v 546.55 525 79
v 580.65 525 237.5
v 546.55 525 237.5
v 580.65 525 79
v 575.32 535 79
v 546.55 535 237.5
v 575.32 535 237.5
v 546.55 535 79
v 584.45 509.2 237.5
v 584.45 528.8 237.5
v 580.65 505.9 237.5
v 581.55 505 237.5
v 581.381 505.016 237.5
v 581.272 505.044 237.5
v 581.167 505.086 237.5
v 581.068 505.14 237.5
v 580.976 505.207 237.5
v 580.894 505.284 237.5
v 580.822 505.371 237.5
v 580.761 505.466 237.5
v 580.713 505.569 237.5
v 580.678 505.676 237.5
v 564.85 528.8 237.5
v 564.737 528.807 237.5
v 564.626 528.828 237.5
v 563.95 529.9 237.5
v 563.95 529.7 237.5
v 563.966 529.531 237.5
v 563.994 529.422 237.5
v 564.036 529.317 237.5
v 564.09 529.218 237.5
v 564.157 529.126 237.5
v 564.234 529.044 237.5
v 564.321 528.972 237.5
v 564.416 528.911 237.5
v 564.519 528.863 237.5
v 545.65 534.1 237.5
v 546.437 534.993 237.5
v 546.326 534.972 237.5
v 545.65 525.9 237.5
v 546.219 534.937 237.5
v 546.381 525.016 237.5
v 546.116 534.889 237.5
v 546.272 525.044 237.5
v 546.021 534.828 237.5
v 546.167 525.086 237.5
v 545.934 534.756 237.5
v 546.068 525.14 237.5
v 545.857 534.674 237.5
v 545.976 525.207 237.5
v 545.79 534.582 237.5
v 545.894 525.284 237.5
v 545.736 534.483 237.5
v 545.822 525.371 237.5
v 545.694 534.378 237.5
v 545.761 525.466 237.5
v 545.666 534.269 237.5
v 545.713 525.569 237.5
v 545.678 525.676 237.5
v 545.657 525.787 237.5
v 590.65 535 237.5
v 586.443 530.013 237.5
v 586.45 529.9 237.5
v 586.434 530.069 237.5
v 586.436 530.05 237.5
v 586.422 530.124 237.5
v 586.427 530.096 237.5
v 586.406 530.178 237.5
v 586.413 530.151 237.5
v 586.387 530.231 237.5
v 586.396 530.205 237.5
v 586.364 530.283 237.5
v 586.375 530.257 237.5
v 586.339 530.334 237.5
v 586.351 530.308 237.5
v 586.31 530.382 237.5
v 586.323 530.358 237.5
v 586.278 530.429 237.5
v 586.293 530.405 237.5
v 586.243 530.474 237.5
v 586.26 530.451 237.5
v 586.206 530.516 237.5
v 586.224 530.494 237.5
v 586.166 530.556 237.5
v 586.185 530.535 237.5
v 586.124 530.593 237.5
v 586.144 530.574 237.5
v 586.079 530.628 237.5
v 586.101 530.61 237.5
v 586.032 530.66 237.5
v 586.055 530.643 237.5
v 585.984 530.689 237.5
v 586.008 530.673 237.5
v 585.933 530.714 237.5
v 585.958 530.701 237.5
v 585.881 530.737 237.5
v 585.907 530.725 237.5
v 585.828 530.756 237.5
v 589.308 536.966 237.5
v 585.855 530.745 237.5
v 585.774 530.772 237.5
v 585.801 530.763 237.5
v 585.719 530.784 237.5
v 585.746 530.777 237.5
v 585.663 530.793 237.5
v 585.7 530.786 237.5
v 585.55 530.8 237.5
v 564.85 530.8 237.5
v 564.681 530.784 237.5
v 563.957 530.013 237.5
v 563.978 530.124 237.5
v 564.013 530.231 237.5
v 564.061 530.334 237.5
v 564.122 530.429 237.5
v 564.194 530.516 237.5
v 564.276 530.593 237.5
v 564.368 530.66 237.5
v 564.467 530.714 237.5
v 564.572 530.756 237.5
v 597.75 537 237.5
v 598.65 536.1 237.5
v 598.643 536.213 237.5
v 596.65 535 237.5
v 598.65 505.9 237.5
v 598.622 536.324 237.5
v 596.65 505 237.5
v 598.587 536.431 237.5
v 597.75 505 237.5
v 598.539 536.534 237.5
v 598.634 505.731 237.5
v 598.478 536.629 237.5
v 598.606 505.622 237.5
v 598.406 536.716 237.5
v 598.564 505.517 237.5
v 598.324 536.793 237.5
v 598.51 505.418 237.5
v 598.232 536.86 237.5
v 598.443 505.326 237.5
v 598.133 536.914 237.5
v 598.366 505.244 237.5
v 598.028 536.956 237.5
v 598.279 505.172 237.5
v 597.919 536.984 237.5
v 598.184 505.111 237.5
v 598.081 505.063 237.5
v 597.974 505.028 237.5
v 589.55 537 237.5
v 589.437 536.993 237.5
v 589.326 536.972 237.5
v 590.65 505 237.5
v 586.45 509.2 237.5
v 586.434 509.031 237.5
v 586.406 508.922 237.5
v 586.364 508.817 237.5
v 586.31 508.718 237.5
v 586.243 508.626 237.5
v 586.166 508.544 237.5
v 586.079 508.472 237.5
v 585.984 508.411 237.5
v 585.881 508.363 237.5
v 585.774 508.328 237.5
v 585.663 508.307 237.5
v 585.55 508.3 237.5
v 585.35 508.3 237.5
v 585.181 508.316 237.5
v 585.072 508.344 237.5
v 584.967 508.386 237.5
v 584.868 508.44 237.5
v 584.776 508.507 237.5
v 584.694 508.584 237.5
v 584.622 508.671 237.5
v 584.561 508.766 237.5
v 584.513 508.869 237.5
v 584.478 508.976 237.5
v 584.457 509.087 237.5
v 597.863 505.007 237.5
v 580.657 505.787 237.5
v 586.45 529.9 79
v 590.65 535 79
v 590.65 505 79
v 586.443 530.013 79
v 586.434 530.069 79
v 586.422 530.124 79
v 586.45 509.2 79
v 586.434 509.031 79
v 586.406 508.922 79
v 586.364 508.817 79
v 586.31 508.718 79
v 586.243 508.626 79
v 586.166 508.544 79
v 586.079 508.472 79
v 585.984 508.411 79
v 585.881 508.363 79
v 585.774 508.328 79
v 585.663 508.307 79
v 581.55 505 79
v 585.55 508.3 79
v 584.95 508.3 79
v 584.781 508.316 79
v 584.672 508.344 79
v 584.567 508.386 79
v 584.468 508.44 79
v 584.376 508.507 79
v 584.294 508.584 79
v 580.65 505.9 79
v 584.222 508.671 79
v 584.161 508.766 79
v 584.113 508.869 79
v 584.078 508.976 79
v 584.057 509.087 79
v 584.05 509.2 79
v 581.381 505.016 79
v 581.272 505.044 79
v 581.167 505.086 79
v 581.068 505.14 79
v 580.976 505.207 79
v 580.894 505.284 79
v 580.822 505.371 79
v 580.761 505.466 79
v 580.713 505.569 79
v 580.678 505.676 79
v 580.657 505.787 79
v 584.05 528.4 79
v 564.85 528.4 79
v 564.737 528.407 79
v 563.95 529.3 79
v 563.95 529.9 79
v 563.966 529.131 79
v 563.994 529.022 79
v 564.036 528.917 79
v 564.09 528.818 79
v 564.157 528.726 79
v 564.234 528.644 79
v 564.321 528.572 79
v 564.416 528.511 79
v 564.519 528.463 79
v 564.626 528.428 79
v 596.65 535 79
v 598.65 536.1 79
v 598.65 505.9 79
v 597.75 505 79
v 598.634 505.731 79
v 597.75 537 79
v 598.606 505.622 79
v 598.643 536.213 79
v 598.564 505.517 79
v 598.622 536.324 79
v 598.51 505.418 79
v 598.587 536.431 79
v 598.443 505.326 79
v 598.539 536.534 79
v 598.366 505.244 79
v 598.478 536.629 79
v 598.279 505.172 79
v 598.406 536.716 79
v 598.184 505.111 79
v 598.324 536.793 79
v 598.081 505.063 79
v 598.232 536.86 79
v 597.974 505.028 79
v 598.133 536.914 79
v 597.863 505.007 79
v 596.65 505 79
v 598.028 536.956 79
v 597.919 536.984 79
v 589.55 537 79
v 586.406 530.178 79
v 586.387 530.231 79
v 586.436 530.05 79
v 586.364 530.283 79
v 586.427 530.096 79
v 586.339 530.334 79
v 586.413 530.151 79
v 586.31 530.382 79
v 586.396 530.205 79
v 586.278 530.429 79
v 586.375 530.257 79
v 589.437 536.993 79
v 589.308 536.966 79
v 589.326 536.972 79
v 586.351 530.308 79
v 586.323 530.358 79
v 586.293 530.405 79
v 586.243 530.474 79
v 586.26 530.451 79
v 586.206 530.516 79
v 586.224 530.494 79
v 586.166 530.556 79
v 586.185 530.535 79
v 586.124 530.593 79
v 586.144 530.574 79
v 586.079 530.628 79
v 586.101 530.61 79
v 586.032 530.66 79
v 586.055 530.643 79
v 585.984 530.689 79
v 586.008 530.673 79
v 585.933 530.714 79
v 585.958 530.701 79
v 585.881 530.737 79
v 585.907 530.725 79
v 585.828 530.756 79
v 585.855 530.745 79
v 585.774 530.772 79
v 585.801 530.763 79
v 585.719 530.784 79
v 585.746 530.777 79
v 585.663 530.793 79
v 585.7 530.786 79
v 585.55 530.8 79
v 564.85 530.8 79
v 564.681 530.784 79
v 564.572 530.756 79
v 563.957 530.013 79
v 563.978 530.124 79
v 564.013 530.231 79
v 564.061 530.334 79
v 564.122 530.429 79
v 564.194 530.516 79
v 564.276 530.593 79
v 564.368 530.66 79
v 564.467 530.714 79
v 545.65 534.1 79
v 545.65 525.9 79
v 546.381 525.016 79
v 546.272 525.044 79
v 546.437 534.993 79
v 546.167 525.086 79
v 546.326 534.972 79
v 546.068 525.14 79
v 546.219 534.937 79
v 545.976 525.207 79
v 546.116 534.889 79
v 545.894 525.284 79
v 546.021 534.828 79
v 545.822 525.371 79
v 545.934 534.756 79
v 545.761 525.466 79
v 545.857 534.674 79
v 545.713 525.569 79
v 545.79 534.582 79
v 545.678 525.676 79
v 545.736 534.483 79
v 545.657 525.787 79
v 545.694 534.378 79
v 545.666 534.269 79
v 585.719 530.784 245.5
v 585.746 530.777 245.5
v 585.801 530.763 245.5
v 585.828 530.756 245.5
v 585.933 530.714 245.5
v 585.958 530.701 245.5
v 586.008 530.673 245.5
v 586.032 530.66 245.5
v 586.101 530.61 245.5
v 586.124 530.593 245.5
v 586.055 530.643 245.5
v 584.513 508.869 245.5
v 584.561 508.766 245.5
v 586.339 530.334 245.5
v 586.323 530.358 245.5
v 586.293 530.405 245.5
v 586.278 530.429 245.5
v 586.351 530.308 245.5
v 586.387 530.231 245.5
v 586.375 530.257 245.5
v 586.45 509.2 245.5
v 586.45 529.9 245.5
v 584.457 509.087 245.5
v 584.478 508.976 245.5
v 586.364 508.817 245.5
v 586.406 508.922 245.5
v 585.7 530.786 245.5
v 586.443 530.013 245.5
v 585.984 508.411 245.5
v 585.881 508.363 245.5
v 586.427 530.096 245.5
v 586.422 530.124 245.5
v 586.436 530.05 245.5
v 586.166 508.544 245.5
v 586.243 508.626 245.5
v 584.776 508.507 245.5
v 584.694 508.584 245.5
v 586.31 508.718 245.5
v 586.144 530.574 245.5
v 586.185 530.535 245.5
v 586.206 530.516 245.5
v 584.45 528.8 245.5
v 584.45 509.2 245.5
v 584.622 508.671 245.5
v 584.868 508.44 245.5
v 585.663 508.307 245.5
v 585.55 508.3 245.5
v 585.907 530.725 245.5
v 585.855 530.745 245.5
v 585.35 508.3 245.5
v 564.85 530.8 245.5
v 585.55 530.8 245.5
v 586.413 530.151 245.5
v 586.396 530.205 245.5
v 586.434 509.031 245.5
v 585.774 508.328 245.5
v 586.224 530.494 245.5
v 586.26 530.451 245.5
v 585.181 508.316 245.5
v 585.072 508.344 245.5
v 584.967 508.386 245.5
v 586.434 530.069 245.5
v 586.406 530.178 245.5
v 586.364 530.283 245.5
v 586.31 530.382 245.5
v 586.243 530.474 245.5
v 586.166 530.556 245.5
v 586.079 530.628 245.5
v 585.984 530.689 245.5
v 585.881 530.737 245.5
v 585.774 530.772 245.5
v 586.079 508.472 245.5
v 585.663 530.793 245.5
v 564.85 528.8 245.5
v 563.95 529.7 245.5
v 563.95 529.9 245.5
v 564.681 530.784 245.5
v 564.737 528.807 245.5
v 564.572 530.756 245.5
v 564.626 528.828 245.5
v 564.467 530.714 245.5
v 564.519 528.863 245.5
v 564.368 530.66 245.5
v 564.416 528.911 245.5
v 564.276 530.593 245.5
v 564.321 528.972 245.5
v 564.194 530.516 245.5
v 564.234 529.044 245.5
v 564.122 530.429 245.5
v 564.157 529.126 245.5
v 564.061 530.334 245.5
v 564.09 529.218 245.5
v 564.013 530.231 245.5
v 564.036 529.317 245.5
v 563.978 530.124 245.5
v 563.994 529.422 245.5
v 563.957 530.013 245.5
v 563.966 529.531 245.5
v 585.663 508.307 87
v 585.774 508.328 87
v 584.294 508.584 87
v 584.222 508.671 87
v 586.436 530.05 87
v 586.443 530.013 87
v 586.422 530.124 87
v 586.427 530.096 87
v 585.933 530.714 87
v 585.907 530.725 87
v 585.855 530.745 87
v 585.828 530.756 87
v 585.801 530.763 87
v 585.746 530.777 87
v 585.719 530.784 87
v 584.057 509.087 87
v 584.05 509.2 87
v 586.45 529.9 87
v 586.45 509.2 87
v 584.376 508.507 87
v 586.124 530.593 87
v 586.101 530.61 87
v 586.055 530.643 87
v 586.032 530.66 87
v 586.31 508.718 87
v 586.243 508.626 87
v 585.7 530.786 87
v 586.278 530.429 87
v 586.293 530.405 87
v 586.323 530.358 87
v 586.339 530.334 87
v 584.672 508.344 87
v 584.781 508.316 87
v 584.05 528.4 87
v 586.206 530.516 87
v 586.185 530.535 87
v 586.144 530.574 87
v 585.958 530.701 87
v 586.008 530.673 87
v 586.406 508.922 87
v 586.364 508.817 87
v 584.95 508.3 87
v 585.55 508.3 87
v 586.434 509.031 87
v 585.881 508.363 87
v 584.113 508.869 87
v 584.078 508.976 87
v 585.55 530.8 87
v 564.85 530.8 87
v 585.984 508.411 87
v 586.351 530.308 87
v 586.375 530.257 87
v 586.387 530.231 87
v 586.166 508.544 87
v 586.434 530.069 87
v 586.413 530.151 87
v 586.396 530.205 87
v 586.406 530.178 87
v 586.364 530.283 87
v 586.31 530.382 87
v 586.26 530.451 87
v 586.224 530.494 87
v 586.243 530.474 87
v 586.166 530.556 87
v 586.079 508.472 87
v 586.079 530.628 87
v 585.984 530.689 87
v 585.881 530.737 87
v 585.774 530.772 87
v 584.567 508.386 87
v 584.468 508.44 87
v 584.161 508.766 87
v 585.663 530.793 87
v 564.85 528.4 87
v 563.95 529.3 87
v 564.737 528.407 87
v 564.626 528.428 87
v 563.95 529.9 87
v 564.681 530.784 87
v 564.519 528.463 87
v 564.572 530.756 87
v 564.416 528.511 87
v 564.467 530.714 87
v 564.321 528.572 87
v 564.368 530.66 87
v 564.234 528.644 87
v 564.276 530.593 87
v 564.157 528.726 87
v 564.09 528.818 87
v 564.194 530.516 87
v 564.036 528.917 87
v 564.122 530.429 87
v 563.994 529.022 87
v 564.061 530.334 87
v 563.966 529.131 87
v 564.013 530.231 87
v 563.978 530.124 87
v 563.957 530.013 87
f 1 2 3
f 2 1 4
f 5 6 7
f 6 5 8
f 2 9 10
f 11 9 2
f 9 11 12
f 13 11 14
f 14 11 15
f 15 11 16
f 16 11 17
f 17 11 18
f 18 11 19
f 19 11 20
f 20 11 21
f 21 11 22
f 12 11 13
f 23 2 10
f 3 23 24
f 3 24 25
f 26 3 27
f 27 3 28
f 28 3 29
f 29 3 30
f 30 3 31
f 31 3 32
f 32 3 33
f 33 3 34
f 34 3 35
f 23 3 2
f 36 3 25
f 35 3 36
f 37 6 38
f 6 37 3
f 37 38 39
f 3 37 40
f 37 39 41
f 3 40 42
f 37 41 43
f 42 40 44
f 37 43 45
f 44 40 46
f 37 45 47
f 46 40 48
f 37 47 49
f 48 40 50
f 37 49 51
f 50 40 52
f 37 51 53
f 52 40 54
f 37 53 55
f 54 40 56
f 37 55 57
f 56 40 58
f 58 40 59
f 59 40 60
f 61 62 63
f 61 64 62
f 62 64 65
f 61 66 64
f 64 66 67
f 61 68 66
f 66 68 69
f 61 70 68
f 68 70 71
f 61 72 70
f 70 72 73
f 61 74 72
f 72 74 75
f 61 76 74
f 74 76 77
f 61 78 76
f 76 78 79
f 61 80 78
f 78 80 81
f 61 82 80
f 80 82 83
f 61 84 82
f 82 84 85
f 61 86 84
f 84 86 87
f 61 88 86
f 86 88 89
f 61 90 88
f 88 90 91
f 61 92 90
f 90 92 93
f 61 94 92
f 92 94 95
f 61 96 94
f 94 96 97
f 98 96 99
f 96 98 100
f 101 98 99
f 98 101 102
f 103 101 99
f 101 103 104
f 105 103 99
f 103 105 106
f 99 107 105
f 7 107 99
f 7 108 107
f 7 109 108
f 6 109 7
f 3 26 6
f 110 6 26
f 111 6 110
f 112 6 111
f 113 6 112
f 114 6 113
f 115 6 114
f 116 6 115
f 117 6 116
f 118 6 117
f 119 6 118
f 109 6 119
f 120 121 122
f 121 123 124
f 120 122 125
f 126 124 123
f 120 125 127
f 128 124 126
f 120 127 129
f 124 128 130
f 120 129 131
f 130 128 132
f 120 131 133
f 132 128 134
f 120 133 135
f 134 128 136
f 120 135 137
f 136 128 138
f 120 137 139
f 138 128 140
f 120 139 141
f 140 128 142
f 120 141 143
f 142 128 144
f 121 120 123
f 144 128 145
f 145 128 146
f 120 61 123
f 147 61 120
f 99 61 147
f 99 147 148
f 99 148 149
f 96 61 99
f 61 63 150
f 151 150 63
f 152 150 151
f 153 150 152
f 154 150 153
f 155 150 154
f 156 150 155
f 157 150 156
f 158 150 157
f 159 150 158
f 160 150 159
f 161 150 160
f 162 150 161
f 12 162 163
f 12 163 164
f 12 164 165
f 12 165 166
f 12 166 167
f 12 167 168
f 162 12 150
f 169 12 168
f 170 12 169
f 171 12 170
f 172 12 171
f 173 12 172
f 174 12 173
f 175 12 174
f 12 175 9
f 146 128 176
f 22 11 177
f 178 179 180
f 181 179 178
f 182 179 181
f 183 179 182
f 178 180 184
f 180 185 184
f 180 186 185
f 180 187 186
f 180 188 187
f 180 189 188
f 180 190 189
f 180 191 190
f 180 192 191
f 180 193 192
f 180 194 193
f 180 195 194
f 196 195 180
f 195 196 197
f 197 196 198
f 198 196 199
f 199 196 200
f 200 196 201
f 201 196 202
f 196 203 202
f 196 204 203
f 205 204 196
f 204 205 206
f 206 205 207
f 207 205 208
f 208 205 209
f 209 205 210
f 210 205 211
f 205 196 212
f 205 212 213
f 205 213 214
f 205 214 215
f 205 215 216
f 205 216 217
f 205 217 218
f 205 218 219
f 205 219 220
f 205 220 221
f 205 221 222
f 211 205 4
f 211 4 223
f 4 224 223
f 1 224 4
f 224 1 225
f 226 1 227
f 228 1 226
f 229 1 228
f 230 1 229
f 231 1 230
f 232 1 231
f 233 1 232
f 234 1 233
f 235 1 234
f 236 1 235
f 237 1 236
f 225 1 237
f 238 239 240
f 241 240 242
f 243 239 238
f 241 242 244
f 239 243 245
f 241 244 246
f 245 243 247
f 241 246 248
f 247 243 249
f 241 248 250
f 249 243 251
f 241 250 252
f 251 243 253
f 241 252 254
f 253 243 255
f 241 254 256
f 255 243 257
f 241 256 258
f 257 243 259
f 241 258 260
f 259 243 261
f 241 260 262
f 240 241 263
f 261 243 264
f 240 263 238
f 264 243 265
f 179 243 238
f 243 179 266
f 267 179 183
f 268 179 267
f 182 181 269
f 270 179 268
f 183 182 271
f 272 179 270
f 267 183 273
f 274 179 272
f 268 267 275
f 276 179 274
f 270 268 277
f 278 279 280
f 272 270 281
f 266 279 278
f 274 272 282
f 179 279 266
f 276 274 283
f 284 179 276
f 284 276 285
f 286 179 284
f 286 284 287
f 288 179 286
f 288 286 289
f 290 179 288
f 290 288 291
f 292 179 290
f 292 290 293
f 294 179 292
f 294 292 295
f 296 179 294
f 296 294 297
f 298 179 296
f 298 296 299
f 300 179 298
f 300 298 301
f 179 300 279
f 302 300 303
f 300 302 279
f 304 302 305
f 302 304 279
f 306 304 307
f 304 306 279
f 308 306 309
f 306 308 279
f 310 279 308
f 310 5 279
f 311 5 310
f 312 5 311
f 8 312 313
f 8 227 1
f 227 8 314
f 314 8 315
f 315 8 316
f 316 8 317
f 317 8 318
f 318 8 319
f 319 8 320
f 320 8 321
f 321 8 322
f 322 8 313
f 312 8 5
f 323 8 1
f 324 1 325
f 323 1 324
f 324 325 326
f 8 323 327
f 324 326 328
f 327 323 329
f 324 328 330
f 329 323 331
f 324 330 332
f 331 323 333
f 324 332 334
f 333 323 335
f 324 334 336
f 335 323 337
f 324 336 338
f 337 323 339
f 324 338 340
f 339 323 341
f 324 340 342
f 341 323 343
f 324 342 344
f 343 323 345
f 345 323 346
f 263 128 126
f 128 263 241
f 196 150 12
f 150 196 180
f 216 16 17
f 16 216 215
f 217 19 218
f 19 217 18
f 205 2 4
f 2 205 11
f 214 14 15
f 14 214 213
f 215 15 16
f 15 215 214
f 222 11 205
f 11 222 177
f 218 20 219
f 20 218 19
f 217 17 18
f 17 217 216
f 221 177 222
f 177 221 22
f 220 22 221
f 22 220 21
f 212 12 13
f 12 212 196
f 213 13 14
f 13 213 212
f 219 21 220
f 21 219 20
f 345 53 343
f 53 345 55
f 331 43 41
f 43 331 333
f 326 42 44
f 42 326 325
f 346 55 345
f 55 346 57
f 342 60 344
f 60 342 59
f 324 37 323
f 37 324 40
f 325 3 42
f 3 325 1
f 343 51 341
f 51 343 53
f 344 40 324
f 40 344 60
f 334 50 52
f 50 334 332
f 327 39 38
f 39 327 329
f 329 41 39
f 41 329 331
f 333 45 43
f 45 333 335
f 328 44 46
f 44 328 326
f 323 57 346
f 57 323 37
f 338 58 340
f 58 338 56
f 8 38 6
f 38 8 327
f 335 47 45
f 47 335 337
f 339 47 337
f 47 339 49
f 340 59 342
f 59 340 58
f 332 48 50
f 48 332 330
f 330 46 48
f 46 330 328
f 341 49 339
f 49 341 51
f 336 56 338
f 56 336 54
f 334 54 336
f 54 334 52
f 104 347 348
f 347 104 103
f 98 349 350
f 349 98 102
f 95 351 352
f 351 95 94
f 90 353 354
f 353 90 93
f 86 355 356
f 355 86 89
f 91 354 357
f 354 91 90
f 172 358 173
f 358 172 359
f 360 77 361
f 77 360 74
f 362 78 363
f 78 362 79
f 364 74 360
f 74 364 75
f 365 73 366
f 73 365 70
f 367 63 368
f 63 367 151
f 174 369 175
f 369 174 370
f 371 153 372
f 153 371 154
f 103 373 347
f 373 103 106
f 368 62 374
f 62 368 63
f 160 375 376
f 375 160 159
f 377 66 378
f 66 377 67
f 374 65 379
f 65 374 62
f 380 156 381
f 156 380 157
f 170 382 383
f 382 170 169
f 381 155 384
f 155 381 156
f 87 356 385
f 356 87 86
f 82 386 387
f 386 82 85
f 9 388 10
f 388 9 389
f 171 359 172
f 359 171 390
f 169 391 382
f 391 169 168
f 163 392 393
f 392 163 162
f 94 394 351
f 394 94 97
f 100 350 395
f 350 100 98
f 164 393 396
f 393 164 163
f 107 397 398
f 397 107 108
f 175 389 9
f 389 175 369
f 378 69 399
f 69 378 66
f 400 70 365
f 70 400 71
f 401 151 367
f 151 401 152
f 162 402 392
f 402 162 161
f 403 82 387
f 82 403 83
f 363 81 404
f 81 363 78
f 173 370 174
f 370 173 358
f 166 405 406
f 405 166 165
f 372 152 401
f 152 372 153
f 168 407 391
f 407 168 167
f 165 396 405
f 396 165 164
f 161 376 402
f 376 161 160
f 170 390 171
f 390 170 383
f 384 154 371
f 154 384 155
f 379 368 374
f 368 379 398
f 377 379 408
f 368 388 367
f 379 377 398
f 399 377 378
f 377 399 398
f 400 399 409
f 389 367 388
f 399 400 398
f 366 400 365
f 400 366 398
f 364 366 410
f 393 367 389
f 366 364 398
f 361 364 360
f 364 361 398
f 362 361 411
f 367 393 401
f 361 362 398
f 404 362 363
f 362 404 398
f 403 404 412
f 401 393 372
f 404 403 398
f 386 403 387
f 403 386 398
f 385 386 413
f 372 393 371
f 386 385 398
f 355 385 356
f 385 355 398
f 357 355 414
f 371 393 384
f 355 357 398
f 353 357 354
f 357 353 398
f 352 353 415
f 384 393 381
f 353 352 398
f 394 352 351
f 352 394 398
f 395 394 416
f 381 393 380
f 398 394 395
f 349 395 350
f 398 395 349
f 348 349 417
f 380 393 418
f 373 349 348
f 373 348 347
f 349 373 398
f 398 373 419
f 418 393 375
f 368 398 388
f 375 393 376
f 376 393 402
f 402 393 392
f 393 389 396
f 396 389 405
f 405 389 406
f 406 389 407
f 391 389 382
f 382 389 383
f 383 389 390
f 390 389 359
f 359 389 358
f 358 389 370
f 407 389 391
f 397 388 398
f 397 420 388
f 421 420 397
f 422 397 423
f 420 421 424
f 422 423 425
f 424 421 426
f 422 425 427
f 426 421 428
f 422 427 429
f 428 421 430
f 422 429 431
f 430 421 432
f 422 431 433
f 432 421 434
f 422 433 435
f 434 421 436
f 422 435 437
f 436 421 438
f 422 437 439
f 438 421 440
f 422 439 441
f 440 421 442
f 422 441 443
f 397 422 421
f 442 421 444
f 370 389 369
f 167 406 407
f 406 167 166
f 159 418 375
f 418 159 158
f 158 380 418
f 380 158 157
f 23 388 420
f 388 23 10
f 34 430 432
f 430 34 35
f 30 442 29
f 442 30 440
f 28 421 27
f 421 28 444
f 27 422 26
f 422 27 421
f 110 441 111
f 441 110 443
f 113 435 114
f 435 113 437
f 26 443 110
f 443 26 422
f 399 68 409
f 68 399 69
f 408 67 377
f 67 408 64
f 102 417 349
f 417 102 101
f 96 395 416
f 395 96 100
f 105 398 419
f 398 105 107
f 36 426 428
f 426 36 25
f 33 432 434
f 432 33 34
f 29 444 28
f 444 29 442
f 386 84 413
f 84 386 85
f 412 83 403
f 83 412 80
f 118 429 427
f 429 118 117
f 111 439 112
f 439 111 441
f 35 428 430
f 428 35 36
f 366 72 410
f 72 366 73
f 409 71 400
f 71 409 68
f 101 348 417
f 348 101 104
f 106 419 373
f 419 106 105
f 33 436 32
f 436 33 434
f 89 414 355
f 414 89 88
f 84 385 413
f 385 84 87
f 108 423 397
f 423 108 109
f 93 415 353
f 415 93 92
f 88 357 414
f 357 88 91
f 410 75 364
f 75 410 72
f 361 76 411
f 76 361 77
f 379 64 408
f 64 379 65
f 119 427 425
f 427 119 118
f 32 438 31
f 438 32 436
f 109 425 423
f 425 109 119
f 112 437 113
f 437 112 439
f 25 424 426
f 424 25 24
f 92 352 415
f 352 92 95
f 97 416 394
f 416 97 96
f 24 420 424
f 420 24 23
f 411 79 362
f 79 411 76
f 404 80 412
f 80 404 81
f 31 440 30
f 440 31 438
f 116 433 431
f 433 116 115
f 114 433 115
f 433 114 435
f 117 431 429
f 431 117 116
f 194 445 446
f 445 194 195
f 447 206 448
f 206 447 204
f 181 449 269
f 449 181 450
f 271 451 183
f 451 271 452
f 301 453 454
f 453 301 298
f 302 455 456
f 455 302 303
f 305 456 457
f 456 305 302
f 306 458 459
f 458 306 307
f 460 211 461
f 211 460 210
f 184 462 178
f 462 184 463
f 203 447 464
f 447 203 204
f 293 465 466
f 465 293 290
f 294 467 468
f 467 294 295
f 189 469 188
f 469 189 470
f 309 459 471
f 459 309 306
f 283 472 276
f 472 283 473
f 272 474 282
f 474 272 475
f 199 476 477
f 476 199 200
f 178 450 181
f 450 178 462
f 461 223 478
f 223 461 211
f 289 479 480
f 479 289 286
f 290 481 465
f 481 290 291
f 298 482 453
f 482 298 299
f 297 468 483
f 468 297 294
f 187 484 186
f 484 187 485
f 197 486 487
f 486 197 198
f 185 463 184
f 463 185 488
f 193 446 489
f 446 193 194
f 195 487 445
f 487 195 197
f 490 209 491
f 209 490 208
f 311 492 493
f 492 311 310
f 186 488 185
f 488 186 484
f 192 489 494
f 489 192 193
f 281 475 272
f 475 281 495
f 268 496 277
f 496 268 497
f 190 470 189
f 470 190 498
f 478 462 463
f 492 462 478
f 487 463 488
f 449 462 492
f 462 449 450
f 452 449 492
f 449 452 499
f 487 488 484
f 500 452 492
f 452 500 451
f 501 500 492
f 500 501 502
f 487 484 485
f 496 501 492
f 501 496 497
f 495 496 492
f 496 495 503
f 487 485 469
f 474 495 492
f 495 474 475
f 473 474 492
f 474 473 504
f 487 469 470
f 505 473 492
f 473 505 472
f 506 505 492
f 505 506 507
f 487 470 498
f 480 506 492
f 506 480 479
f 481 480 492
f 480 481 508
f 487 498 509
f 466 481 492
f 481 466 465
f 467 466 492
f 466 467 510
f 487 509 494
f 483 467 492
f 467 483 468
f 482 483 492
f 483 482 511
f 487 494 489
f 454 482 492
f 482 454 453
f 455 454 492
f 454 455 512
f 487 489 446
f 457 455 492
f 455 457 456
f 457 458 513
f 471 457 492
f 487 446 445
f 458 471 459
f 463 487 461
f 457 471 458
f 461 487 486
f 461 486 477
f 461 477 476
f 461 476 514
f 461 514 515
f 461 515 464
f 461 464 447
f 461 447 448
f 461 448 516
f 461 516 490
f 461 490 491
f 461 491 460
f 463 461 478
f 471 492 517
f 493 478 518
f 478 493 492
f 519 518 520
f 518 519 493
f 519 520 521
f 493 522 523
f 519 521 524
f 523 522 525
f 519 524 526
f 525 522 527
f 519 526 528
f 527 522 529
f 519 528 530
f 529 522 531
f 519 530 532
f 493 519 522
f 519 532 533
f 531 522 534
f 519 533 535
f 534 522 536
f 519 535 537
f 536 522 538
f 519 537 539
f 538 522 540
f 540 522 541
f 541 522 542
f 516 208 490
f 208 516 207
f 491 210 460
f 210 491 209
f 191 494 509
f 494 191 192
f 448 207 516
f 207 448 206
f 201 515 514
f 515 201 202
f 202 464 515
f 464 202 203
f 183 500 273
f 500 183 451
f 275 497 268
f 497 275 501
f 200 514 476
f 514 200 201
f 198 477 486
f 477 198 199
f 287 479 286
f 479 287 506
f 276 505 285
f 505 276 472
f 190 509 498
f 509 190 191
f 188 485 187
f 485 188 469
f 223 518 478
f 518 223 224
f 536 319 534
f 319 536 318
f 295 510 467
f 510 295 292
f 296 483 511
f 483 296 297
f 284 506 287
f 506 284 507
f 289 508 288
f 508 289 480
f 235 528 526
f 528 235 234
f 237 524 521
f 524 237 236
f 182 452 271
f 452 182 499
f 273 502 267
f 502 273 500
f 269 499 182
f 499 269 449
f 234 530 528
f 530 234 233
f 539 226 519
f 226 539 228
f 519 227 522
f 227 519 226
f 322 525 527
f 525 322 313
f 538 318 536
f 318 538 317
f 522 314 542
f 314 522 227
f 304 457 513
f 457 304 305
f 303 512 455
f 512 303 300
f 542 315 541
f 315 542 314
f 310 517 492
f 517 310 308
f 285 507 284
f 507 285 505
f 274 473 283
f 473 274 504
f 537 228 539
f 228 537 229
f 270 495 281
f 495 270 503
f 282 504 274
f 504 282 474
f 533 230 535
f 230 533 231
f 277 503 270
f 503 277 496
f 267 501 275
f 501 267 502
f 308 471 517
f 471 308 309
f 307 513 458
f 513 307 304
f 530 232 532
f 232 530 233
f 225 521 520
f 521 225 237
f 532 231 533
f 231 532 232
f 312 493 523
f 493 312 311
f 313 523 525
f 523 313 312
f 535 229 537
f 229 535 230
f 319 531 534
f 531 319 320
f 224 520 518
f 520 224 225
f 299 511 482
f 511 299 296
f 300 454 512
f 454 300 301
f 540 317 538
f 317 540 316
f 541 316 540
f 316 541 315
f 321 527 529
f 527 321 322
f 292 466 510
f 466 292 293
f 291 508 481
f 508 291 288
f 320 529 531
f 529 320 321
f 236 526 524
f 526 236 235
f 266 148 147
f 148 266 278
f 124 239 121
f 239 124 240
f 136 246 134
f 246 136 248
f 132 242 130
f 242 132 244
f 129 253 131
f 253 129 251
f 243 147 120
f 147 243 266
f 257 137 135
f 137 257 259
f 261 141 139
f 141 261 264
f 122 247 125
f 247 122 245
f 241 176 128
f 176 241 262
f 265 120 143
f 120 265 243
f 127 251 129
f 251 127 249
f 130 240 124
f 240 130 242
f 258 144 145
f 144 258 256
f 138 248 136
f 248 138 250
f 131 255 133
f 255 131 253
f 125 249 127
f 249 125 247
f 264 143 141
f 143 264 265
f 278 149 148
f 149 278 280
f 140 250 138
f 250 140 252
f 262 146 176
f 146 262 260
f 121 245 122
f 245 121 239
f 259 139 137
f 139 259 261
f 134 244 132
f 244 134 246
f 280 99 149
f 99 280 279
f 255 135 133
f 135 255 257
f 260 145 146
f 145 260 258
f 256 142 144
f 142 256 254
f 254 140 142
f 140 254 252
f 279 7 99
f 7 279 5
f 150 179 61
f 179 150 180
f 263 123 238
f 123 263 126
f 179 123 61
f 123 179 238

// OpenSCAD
// file: construction.scad
/*
Specialized construction functions specifically for the enclosure.
By combining these operators the various instances of enclosure pieces 
can be constructed.
*/
include <parameters.scad>;
use <utility.scad>;

module lug() {
    ra = knob_diameter/2;
    rb = lug_diameter/2;
    rotate([0,90,90]) 
        rotate_extrude()
            color("DarkSeaGreen")
            polygon([[0,0],[0,lug_height],[rb,lug_height],
                [rb,2.5],[ra,1],[ra,0]]);
}

// extend the corner frame to be symmetrical with the front corner
module extend_frame_x(height=frame_corner_height) {
    union() {
        children();
        color("SteelBlue")
        translate([hinge_inner_diameter*2, hinge_inner_diameter,0]) 
            rotate([0,0,-90])
                frame( hinge_inner_diameter*3+1, 
                    height, hinge_inner_diameter, 
                    corner_roundness );
    }
}

module frame( width, height, thickness, roundness ) {
        linear_extrude(height=height)
            apply_roundness(roundness, $fs =0.01) 
                    square( [thickness, width] );
}

module frame_corner( width, height, thickness, roundness ) {    
    union() {
        mirror([0,1,0]) 
            rotate([0,0,-90])
                frame( width, height, thickness, roundness );
        frame( width, height, thickness + panel_thickness, roundness );
    }   
}

module frame_connector_corner(clearance=0) {
    translate([panel_thickness*1.7,panel_thickness*0.70, 0]) 
        cornerize()
            frame( frame_corner_width*0.75, frame_connector_depth, 
                frame_thickness*.20+clearance, corner_roundness );
        
}

module add_lugs() {   
    union() {
        children();
        translate([lug_offset_x,-lug_height,lug_offset_z]) 
            lug();
        translate([lug_offset_x,-lug_height, lug_offset_z+lug_offset_gap])
            lug(); 
    } 
}

module add_connector(height=frame_corner_height) {
    union() {
        children();

        color("SteelBlue")
        translate([0,0,height])
            frame_connector_corner();
    }
}

module add_hinge_post( top=false ) {
    union() {
        difference() {
            children();

            // create a negative space that snuggly fits the hinge
            translate([frame_corner_width+plastic_thickness+hinge_gap,
                hinge_inner_diameter/2, (top?frame_corner_height:0)])
                mirror(top?[0,0,1]:[0,0,0])
                    union() {
                         height = hinge_height-hinge_inner_diameter;
                        translate([0,0,height/2]) 
                            cube([hinge_inner_diameter+2,
                                hinge_inner_diameter+2,height+1.3],true);
                        // hinge open
                        rotate([0,0,-90]) translate([0,0,-0.1]) scale(1.05) hinge();
                        // hinge closed
                        rotate([0,0,0]) translate([0,0,-0.1]) scale(1.05) hinge();
                    }
            
        }
        color("SteelBlue")
        translate([frame_corner_width+plastic_thickness+hinge_gap,hinge_inner_diameter/2,0])
            cylinder(d=hinge_inner_diameter, frame_corner_height);
    }
}

module add_outside_frame( height ) {
    union() {
        children();
        translate([-plastic_thickness,-plastic_thickness,0])
            color("SteelBlue")
            frame( frame_corner_width+plastic_thickness, height, frame_thickness,
                corner_roundness);
        translate([14.5,0.05,height/2])
            color("SteelBlue")
            rotate([0,0,8])
            cube([frame_corner_width/2,plastic_thickness,height],true);
    }
}

module hinge() {
    height = hinge_height-hinge_inner_diameter;
    width = hinge_inner_diameter+hinge_ring_thickness;
    difference() {
        
        // create the base shape for the hinge
        union() {    
            cylinder(d=width, height);
            
            translate([hinge_inner_diameter*3+hinge_clearance,
                -hinge_offset,height/2-plastic_thickness/2]) 
                cube([hinge_length,hinge_thickness,
                    height+plastic_thickness],true);
           
            translate([2.52,-5.2,height/2]) 
                rotate([0,0,40]) 
                    cube([hinge_inner_diameter,
                        width+1,height],true);
        }
        
        // remove a hole for the hinge post to slide into
        cylinder(d=hinge_inner_diameter+tolerance_smooth, height+1);
        
        // trim the left corner
        translate([4,-17.5,height/2-1]) 
            rotate([0,0,145]) 
                cube([50,width-2,height+3],true);
        
        // smooth the tranistion to the bottom edge
        translate([32,-10,height/2-18.25]) 
            rotate([-88.5,0.1,96]) 
                cube([40,20,60],true);
        
        // add a chamfer to right corner
        translate([hinge_length+8,0,height+25]) 
            rotate([0,45,0]) 
            cube(50,true);
    }   
}

module add_connector_slot() {
    difference() {
        children();
        frame_connector_corner(tolerance_tight);
    }
}

module frame_vertical() {
    add_connector_slot()
    add_connector(frame_vertical_height)
    extend_frame_x(frame_vertical_height)
        frame_corner( frame_corner_width, 
            frame_vertical_height, frame_thickness, 
            corner_roundness );          
}

module grip() {
    rotate([90,90,90])
        color("DarkSeaGreen")
        frame(plastic_thickness,plastic_thickness,plastic_thickness,corner_roundness);
}

module add_snap_lock_slot(top=false) {
    difference() {
        children();
        translate([0,0,top?frame_corner_height+shelf_height:-shelf_height])
            mirror(top?[0,0,1]:[0,0,0])
                 snaplock(tolerance_tight,top);
    }
}

module lug2(clearance) {
    color("DarkSeaGreen")
    rotate([90,0,0])
            frame(frame_connector_depth+clearance,snaplock_connector_size/2,
                connector_thickness+clearance,corner_roundness);
}

module snaplock(clearance=0,top=false) {
    height = shelf_height+snaplock_connector_size+plastic_thickness+clearance;
    union() {
        color("Magenta")
        difference() {
            translate([snaplock_size,-snaplock_thickness*3,-plastic_thickness])
                rotate([0,0,90])
                    frame(snaplock_size+clearance,height,
                        snaplock_width*2+plastic_thickness, corner_roundness);
            fix_preview2() cube([snaplock_size*1.1,snaplock_width+plastic_thickness,shelf_height]);
        }

        // grips at top
        translate([5,1,shelf_height+1.5]) grip();
        translate([18,1,shelf_height+1.5]) grip();

        // grips at bottom
        translate([5,1,0.5]) grip();
        translate([18,1,0.5]) grip();

        // connector lugs
        translate([3*snaplock_size/4-connector_thickness/2-clearance/2,
            frame_connector_depth+snaplock_thickness,
            shelf_height+snaplock_connector_size/2 - (snaplock_connector_size/4)-clearance/2])
            lug2(clearance);

        translate([(top?2:1)*snaplock_size/4-connector_thickness/2-clearance/2,
            frame_connector_depth+snaplock_thickness,
            shelf_height+snaplock_connector_size/2 - (snaplock_connector_size/4)-clearance/2])
            lug2(clearance);
    }
}
// file: support.scad
/*
Provides support objects that are used to model the environment of the enclosure
to ensure the pieces slot together and fit properly.
*/
include <parameters.scad>;
use <utility.scad>;

module wall_panel() {
    cube([panel_height,panel_width,panel_thickness]);
}

module door_panel() {
     cube([door_panel_width,door_panel_height,door_panel_thickness]);
}

module left_wall_panel() {
    translate([panel_thickness,0,panel_offset_z]) 
        rotate([0,-90,0]) 
            wall_panel();
}

module back_wall_panel() {
    translate([(enclosure_width-panel_width)/2,
            enclosure_depth-panel_thickness-plastic_thickness,
            0]) 
        rotate([-90,-90,0]) 
            wall_panel();
}

module right_wall_panel() {
    translate([enclosure_width,0,panel_offset_z]) 
        rotate([0,-90,0]) 
            wall_panel();
}

module left_door(open=false) {
    translate([frame_corner_width+plastic_thickness+hinge_gap,
            hinge_inner_diameter/2,0]) 
        rotate([90,0,open?-90:0]) 
            translate([door_hinge_offset,0,hinge_offset-
                    door_panel_thickness/2])
                door_panel();
}

module right_door(open=false) {
    translate([enclosure_width,0,0])  
        mirror([1,0,0]) left_door(open);
}
// file: utility.scad
/*
Generically useful utility functions.
*/

// applies roundness without altering dimensions of object
module apply_roundness(r)
    offset(r) offset(delta=-r) children(0);

// makes a corner piece by mirroring and rotating one side
module cornerize() {
    union() {
        children(0);
        mirror([0,1,0]) 
            rotate([0,0,-90])
                children(0);
    }
} 

module explode(vector) {
    for(i=[0:$children-1])
        translate(vector*i)
            children(i);

}

/*
 The fix_preview series of functions are used to make small
 translations in order to reduce conincident plane artifacts
 from the preview mode. 

 It would be nice to have just one module for this but I haven't
 figured out a way of doing this generically - so the following
 uses a small translation in different directions depending on
 the use case needed.
*/
module fix_preview() {
    translate($preview?[-0.001,-0.001,-0.001]:[0,0,0])
        children(0);
}

module fix_preview2() {
    translate($preview?[-0.001,0.001,-0.001]:[0,0,0])
        children(0);
}

module fix_preview3() {
    translate($preview?[-0.001,0.001,0.001]:[0,0,0])
        children(0);
}
// file: parameters.scad
$fn=50;

// Wall thickness and tolerance
plastic_thickness=2.0;
tolerance_smooth=0.45;
tolerance_tight=0.40;
corner_roundness=0.9;

// Specify enclosure dimensions
enclosure_height=475.0;
enclosure_depth=535.0;

// Wall panel dimensions
panel_thickness=6.0;
panel_height=450.0;
panel_width=535.0;
panel_offset_z = enclosure_height - panel_height;

// Door panel dimensions
door_panel_thickness=3.0;
door_panel_width=250.0;
door_panel_height=475.0;
door_hinge_offset=6.5;

// Frame
frame_corner_width=30.0;
frame_corner_height=79.0;
frame_thickness = plastic_thickness*2 + panel_thickness;
frame_side = (enclosure_height - frame_corner_height*2)/2;
frame_clip_height=50.5;
frame_vertical_height = (enclosure_height-frame_corner_height*2)/2;
frame_connector_depth = 8.0;

// Lug
knob_diameter=9.8;
lug_diameter=6.2;
lug_gap=1.4;
lug_height = lug_gap+2.15;
lug_offset_x=15.0;
lug_offset_z=27.0;
lug_offset_gap=32;

// Snaplock
shelf_height=50.3+tolerance_tight;
snaplock_width=5+tolerance_tight;
snaplock_size=25;
snaplock_thickness=plastic_thickness;
snaplock_connector_size=15;
connector_thickness=frame_thickness*.4;

// Door hinge
hinge_inner_diameter=10;
hinge_height=25;
hinge_length=53;
hinge_gap = 9.6;
hinge_clearance = 1.5;
hinge_ring_thickness=3.0;
hinge_thickness=plastic_thickness*2 + door_panel_thickness;
hinge_offset=6.5+plastic_thickness;

enclosure_width=2*(frame_corner_width+plastic_thickness+hinge_gap
    +door_hinge_offset) + door_panel_width*2 +tolerance_smooth;
// main file
include <parameters.scad>
use <utility.scad>
use <support.scad>
use <construction.scad>

module back_right_vertical_a() {
    difference() {
        translate([enclosure_width,enclosure_depth,frame_corner_height])
            mirror([0,1,0])
            mirror([1,0,0])
                add_outside_frame(frame_vertical_height) 
                    color("SteelBlue")
                    frame_vertical();
        fix_preview() right_wall_panel();
    }
}

%fix_preview() right_wall_panel();
back_right_vertical_a();
